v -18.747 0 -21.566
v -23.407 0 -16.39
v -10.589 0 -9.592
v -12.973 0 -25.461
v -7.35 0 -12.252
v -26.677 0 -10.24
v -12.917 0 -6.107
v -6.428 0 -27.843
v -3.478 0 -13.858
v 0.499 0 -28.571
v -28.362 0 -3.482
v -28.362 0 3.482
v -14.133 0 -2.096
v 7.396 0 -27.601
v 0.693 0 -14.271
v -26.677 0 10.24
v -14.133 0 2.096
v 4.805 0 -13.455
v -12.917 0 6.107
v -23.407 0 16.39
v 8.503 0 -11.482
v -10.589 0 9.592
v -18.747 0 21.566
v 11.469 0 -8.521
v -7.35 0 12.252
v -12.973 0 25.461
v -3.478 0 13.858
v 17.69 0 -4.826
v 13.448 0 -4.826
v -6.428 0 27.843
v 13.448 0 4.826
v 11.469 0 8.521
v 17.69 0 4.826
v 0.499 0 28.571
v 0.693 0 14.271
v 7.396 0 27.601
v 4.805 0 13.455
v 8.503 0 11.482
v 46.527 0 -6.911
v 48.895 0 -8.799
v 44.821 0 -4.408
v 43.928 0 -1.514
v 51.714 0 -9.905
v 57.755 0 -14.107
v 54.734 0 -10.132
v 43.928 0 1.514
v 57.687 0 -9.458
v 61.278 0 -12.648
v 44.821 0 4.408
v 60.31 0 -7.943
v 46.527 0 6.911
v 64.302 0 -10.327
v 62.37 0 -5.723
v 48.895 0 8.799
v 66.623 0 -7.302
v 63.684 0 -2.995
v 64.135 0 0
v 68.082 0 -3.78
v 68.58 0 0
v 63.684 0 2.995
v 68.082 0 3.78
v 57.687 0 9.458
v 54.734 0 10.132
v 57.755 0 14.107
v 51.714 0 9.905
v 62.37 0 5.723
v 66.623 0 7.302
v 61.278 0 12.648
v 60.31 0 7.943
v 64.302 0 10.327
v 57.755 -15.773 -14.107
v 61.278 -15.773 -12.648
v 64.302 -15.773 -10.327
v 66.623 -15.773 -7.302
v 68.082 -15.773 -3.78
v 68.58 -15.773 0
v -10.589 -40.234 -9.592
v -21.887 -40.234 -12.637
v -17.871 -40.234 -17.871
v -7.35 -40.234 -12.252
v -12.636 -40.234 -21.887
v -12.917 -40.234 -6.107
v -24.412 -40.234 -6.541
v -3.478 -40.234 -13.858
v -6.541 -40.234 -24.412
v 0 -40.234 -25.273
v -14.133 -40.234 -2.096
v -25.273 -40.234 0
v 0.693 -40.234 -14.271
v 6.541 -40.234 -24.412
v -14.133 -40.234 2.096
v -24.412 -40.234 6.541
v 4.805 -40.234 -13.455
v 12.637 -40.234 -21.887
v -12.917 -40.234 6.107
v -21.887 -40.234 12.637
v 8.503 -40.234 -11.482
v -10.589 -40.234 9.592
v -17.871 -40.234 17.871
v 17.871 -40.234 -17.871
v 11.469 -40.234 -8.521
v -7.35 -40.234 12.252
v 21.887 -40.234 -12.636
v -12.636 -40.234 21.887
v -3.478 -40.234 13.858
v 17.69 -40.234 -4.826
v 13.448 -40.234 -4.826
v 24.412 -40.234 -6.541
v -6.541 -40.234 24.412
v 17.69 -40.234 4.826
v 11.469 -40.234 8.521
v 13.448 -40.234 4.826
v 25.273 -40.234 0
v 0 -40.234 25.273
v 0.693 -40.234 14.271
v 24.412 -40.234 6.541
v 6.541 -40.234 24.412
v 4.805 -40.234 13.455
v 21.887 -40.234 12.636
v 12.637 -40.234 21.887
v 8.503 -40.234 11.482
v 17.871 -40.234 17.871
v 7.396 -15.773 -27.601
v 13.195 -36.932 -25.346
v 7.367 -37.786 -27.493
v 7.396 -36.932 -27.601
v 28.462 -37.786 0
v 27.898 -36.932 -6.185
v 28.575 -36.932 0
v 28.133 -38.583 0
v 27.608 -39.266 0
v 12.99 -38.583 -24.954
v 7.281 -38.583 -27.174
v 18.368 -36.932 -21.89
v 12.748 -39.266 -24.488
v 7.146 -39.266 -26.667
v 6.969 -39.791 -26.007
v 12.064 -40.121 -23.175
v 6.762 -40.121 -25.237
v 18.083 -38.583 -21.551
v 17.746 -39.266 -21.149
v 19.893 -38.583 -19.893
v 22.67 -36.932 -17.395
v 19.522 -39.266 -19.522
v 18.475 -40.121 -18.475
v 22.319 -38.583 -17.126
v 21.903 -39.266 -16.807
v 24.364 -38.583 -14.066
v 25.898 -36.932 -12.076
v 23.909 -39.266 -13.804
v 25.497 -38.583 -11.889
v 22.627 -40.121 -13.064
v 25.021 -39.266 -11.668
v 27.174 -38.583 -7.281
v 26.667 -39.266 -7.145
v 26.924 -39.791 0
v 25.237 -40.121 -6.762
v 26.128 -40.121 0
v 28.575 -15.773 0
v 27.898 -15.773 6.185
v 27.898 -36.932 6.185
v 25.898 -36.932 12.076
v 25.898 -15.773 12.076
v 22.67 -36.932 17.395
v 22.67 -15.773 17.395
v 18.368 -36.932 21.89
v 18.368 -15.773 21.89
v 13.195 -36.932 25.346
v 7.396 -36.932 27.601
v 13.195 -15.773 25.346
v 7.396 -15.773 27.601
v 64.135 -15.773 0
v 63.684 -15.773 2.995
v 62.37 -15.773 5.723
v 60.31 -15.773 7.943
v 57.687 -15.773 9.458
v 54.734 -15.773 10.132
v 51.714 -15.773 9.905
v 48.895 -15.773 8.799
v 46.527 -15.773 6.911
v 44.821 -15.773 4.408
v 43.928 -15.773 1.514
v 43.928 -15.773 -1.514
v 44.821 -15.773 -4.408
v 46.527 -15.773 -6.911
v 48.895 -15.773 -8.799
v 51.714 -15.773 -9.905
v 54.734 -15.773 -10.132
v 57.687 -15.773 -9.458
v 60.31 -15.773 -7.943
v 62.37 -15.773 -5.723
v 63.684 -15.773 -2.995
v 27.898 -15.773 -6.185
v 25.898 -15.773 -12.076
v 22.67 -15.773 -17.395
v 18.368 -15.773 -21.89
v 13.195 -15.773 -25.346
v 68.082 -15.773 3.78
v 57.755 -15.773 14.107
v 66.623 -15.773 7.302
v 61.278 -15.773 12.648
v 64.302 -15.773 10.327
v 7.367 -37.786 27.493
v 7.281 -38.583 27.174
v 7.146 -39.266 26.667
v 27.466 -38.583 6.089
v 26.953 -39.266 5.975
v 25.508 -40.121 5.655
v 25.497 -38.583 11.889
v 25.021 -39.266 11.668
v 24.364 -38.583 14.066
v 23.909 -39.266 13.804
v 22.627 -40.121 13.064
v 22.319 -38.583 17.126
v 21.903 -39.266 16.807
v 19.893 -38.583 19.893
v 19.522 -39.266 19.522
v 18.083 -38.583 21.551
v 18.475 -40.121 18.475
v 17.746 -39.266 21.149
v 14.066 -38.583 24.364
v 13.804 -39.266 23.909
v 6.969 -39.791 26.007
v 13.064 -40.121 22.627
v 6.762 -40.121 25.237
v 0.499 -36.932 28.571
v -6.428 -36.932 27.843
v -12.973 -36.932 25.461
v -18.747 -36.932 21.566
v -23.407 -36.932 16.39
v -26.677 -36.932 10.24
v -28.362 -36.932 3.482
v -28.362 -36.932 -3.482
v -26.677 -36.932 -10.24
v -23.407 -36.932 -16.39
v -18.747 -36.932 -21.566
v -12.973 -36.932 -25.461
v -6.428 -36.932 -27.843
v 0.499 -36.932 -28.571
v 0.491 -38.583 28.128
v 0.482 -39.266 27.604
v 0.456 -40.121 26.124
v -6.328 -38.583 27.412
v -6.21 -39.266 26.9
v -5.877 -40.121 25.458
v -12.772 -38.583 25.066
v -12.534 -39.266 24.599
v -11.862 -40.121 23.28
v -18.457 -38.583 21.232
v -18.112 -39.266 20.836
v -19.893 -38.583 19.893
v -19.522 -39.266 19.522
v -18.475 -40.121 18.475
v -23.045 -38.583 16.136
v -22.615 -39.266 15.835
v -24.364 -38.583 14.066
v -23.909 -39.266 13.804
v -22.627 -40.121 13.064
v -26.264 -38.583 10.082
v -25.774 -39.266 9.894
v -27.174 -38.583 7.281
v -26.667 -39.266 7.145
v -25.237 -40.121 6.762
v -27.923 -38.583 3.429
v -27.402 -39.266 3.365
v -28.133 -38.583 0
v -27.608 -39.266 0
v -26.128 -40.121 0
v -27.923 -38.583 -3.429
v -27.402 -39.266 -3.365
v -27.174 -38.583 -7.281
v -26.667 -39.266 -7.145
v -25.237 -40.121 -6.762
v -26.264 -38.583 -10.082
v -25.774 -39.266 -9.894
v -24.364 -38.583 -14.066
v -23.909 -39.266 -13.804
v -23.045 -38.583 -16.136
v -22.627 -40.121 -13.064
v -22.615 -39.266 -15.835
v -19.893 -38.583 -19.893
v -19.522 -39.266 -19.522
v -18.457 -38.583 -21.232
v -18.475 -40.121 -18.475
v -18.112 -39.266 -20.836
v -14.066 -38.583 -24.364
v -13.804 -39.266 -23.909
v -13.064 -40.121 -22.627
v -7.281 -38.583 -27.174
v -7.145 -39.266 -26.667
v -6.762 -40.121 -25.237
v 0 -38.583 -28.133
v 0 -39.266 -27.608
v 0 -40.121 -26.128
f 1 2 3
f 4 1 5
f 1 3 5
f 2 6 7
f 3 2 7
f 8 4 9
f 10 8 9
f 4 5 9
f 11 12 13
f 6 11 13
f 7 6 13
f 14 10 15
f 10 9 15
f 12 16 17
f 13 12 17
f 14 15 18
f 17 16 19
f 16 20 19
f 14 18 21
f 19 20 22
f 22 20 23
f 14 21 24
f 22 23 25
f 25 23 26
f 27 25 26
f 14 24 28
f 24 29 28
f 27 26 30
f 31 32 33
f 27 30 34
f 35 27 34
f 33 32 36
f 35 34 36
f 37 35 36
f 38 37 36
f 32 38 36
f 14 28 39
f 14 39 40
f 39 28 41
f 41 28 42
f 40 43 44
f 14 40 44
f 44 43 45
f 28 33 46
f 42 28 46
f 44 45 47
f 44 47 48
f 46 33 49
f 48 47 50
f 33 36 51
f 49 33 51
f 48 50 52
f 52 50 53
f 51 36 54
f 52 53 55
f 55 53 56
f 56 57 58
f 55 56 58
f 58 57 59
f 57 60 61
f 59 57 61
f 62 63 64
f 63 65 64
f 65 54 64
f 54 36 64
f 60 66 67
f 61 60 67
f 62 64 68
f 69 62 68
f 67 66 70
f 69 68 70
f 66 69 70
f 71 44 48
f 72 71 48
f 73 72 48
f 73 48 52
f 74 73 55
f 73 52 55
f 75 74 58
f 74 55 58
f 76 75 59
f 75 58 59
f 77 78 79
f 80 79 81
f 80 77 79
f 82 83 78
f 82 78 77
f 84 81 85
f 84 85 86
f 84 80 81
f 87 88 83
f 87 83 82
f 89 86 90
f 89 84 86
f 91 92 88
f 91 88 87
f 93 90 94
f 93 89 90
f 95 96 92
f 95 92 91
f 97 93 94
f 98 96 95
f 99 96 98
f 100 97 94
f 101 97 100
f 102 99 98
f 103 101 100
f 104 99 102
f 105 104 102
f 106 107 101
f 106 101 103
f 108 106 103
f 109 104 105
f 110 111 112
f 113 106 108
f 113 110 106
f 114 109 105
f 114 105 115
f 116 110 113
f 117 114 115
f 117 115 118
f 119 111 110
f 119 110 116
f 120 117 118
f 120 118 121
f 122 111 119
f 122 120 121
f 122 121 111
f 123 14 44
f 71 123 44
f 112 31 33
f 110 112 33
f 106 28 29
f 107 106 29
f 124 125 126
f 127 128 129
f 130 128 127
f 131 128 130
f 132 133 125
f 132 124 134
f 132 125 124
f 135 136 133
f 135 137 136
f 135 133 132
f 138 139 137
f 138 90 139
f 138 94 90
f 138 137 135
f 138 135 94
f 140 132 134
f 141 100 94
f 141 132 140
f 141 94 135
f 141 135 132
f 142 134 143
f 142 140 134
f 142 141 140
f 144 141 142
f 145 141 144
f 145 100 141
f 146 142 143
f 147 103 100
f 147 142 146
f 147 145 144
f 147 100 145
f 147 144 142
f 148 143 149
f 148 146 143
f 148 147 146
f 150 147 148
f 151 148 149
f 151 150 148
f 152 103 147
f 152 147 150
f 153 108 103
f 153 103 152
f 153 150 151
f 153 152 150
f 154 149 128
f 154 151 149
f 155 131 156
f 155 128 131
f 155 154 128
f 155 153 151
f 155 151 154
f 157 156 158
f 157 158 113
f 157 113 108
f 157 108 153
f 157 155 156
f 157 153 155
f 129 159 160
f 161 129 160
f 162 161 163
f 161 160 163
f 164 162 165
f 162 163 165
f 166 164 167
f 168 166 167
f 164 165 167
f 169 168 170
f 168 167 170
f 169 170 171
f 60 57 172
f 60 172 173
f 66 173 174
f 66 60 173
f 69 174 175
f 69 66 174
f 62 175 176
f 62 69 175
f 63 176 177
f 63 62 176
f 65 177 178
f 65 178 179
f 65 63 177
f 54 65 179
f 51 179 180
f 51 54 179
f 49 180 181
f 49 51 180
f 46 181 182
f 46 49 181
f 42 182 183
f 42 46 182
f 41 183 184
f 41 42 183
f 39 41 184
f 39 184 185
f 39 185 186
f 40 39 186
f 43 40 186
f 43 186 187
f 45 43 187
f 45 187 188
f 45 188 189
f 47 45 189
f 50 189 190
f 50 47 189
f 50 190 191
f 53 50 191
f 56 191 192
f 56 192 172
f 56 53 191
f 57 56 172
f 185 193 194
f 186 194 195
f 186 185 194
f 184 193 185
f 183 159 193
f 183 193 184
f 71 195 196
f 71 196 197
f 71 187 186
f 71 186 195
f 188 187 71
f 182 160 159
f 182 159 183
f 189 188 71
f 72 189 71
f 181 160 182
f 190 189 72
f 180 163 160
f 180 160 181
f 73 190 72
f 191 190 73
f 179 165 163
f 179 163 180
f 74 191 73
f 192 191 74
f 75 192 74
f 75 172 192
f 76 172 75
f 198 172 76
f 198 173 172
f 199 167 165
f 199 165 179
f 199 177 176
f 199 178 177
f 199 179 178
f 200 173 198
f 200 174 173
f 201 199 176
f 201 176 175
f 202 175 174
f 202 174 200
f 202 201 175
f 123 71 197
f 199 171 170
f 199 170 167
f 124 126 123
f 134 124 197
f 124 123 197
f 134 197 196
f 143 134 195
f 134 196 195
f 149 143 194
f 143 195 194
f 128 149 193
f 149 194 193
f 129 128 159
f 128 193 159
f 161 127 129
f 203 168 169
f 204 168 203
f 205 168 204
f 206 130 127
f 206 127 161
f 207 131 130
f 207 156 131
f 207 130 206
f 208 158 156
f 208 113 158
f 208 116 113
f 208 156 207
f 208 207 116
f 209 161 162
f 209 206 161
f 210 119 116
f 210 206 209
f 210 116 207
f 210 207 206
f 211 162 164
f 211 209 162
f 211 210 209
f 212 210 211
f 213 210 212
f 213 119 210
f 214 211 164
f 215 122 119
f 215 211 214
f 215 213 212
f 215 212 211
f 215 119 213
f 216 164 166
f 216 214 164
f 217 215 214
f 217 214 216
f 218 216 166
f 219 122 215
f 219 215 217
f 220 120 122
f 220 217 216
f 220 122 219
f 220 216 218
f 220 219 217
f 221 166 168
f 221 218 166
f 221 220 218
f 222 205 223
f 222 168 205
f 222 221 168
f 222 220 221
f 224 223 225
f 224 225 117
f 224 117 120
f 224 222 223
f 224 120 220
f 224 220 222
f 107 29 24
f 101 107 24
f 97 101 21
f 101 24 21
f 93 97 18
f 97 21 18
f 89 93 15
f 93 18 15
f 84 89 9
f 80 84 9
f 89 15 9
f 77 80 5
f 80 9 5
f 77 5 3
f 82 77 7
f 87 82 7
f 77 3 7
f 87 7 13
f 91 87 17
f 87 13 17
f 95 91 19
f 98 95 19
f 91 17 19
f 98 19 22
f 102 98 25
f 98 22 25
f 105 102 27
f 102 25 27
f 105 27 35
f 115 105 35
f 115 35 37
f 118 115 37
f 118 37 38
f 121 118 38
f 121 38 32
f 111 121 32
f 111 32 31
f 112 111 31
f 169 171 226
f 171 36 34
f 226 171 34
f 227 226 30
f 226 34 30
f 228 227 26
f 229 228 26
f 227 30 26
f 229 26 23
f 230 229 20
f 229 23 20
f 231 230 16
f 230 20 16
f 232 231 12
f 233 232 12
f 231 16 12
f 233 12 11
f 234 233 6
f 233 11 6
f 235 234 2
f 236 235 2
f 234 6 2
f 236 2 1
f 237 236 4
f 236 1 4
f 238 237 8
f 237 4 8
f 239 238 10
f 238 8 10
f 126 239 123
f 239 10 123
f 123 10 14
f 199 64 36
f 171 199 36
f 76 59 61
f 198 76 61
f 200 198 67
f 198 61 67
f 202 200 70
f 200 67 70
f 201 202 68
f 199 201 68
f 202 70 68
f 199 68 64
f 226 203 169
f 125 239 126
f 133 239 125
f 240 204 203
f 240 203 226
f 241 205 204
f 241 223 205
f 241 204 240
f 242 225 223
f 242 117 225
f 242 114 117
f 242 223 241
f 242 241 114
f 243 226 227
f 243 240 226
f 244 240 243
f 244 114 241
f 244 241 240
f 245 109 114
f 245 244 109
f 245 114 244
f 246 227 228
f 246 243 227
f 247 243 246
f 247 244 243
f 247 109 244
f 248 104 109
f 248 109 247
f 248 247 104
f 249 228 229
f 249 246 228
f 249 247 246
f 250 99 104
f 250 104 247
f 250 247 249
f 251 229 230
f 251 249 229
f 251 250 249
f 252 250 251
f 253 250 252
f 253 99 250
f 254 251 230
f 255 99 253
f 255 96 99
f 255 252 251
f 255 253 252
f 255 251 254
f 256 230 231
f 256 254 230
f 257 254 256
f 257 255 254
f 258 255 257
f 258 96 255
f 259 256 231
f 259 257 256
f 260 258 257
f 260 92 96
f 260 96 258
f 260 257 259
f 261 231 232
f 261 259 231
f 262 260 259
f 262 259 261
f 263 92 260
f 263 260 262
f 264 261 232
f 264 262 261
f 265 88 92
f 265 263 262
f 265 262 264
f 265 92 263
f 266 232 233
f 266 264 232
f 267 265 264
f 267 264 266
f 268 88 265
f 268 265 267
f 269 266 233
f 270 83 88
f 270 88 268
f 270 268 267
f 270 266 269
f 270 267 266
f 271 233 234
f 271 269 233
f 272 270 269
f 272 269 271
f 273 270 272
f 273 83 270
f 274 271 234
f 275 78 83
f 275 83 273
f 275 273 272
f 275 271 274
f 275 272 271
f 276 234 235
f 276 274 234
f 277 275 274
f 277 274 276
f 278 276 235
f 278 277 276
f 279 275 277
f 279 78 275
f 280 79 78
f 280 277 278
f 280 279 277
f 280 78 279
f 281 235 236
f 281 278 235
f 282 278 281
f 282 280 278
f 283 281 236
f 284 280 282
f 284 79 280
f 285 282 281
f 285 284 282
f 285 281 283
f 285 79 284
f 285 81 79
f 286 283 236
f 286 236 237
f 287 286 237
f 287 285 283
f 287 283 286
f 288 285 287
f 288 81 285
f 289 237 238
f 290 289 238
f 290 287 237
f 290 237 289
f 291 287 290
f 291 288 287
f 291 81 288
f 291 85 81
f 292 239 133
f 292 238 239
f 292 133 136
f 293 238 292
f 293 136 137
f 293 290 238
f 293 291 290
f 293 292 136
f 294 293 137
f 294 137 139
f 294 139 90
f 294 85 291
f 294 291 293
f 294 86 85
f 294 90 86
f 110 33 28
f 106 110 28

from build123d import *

# Parameters (mm, degrees)
F1_DEPTH = 40.2336
F0_R     = 10.16
F2_DEPTH = 15.7734
F3_R     = 3.302


with BuildPart() as f1:
    # F0 (on Front) → F1 (new body)
    with BuildSketch(Plane.XZ):
        with BuildLine():
            ThreePointArc((7.395882, -27.601296), (22.670112, -17.395305), (28.575, 0))
            ThreePointArc((28.575, 0), (22.670112, 17.395305), (7.395882, 27.601296))
            ThreePointArc((7.395882, 27.601296), (-28.575, 0), (7.395882, -27.601296))
        make_face()
        with BuildLine():
            ThreePointArc((13.447765, -4.826), (-14.2875, 0), (13.447765, 4.826))
            Line((13.447765, 4.826), (17.689565, 4.826))
            Line((17.689565, 4.826), (17.689565, -4.826))
            Line((17.689565, -4.826), (13.447765, -4.826))
        make_face(mode=Mode.SUBTRACT)
    extrude(amount=F1_DEPTH)

    # F0 (on Front) → F2 (join)
    with BuildSketch(Plane.XZ):
        with BuildLine():
            ThreePointArc((7.395882, 27.601296), (22.670112, 17.395305), (28.575, 0))
            ThreePointArc((28.575, 0), (22.670112, -17.395305), (7.395882, -27.601296))
            Line((7.395882, -27.601296), (57.755118, -14.107329))
            ThreePointArc((57.755118, -14.107329), (39.37, 0), (57.755118, 14.107329))
            Line((57.755118, 14.107329), (7.395882, 27.601296))
        make_face()
        with BuildLine():
            ThreePointArc((68.58, 0), (65.561946, 8.890934), (57.755118, 14.107329))
            ThreePointArc((57.755118, 14.107329), (39.37, 0), (57.755118, -14.107329))
            ThreePointArc((57.755118, -14.107329), (65.561946, -8.890934), (68.58, 0))
        make_face()
        with Locations((53.975, 0)):
            Circle(F0_R, mode=Mode.SUBTRACT)
    extrude(amount=F2_DEPTH)

    # F3
    f3_edges = [f1.edges().sort_by_distance(p)[0] for p in [
        (-7.395882, -40.2336, 27.601296),
    ]]
    fillet(f3_edges, radius=F3_R)


solid = f1.part
